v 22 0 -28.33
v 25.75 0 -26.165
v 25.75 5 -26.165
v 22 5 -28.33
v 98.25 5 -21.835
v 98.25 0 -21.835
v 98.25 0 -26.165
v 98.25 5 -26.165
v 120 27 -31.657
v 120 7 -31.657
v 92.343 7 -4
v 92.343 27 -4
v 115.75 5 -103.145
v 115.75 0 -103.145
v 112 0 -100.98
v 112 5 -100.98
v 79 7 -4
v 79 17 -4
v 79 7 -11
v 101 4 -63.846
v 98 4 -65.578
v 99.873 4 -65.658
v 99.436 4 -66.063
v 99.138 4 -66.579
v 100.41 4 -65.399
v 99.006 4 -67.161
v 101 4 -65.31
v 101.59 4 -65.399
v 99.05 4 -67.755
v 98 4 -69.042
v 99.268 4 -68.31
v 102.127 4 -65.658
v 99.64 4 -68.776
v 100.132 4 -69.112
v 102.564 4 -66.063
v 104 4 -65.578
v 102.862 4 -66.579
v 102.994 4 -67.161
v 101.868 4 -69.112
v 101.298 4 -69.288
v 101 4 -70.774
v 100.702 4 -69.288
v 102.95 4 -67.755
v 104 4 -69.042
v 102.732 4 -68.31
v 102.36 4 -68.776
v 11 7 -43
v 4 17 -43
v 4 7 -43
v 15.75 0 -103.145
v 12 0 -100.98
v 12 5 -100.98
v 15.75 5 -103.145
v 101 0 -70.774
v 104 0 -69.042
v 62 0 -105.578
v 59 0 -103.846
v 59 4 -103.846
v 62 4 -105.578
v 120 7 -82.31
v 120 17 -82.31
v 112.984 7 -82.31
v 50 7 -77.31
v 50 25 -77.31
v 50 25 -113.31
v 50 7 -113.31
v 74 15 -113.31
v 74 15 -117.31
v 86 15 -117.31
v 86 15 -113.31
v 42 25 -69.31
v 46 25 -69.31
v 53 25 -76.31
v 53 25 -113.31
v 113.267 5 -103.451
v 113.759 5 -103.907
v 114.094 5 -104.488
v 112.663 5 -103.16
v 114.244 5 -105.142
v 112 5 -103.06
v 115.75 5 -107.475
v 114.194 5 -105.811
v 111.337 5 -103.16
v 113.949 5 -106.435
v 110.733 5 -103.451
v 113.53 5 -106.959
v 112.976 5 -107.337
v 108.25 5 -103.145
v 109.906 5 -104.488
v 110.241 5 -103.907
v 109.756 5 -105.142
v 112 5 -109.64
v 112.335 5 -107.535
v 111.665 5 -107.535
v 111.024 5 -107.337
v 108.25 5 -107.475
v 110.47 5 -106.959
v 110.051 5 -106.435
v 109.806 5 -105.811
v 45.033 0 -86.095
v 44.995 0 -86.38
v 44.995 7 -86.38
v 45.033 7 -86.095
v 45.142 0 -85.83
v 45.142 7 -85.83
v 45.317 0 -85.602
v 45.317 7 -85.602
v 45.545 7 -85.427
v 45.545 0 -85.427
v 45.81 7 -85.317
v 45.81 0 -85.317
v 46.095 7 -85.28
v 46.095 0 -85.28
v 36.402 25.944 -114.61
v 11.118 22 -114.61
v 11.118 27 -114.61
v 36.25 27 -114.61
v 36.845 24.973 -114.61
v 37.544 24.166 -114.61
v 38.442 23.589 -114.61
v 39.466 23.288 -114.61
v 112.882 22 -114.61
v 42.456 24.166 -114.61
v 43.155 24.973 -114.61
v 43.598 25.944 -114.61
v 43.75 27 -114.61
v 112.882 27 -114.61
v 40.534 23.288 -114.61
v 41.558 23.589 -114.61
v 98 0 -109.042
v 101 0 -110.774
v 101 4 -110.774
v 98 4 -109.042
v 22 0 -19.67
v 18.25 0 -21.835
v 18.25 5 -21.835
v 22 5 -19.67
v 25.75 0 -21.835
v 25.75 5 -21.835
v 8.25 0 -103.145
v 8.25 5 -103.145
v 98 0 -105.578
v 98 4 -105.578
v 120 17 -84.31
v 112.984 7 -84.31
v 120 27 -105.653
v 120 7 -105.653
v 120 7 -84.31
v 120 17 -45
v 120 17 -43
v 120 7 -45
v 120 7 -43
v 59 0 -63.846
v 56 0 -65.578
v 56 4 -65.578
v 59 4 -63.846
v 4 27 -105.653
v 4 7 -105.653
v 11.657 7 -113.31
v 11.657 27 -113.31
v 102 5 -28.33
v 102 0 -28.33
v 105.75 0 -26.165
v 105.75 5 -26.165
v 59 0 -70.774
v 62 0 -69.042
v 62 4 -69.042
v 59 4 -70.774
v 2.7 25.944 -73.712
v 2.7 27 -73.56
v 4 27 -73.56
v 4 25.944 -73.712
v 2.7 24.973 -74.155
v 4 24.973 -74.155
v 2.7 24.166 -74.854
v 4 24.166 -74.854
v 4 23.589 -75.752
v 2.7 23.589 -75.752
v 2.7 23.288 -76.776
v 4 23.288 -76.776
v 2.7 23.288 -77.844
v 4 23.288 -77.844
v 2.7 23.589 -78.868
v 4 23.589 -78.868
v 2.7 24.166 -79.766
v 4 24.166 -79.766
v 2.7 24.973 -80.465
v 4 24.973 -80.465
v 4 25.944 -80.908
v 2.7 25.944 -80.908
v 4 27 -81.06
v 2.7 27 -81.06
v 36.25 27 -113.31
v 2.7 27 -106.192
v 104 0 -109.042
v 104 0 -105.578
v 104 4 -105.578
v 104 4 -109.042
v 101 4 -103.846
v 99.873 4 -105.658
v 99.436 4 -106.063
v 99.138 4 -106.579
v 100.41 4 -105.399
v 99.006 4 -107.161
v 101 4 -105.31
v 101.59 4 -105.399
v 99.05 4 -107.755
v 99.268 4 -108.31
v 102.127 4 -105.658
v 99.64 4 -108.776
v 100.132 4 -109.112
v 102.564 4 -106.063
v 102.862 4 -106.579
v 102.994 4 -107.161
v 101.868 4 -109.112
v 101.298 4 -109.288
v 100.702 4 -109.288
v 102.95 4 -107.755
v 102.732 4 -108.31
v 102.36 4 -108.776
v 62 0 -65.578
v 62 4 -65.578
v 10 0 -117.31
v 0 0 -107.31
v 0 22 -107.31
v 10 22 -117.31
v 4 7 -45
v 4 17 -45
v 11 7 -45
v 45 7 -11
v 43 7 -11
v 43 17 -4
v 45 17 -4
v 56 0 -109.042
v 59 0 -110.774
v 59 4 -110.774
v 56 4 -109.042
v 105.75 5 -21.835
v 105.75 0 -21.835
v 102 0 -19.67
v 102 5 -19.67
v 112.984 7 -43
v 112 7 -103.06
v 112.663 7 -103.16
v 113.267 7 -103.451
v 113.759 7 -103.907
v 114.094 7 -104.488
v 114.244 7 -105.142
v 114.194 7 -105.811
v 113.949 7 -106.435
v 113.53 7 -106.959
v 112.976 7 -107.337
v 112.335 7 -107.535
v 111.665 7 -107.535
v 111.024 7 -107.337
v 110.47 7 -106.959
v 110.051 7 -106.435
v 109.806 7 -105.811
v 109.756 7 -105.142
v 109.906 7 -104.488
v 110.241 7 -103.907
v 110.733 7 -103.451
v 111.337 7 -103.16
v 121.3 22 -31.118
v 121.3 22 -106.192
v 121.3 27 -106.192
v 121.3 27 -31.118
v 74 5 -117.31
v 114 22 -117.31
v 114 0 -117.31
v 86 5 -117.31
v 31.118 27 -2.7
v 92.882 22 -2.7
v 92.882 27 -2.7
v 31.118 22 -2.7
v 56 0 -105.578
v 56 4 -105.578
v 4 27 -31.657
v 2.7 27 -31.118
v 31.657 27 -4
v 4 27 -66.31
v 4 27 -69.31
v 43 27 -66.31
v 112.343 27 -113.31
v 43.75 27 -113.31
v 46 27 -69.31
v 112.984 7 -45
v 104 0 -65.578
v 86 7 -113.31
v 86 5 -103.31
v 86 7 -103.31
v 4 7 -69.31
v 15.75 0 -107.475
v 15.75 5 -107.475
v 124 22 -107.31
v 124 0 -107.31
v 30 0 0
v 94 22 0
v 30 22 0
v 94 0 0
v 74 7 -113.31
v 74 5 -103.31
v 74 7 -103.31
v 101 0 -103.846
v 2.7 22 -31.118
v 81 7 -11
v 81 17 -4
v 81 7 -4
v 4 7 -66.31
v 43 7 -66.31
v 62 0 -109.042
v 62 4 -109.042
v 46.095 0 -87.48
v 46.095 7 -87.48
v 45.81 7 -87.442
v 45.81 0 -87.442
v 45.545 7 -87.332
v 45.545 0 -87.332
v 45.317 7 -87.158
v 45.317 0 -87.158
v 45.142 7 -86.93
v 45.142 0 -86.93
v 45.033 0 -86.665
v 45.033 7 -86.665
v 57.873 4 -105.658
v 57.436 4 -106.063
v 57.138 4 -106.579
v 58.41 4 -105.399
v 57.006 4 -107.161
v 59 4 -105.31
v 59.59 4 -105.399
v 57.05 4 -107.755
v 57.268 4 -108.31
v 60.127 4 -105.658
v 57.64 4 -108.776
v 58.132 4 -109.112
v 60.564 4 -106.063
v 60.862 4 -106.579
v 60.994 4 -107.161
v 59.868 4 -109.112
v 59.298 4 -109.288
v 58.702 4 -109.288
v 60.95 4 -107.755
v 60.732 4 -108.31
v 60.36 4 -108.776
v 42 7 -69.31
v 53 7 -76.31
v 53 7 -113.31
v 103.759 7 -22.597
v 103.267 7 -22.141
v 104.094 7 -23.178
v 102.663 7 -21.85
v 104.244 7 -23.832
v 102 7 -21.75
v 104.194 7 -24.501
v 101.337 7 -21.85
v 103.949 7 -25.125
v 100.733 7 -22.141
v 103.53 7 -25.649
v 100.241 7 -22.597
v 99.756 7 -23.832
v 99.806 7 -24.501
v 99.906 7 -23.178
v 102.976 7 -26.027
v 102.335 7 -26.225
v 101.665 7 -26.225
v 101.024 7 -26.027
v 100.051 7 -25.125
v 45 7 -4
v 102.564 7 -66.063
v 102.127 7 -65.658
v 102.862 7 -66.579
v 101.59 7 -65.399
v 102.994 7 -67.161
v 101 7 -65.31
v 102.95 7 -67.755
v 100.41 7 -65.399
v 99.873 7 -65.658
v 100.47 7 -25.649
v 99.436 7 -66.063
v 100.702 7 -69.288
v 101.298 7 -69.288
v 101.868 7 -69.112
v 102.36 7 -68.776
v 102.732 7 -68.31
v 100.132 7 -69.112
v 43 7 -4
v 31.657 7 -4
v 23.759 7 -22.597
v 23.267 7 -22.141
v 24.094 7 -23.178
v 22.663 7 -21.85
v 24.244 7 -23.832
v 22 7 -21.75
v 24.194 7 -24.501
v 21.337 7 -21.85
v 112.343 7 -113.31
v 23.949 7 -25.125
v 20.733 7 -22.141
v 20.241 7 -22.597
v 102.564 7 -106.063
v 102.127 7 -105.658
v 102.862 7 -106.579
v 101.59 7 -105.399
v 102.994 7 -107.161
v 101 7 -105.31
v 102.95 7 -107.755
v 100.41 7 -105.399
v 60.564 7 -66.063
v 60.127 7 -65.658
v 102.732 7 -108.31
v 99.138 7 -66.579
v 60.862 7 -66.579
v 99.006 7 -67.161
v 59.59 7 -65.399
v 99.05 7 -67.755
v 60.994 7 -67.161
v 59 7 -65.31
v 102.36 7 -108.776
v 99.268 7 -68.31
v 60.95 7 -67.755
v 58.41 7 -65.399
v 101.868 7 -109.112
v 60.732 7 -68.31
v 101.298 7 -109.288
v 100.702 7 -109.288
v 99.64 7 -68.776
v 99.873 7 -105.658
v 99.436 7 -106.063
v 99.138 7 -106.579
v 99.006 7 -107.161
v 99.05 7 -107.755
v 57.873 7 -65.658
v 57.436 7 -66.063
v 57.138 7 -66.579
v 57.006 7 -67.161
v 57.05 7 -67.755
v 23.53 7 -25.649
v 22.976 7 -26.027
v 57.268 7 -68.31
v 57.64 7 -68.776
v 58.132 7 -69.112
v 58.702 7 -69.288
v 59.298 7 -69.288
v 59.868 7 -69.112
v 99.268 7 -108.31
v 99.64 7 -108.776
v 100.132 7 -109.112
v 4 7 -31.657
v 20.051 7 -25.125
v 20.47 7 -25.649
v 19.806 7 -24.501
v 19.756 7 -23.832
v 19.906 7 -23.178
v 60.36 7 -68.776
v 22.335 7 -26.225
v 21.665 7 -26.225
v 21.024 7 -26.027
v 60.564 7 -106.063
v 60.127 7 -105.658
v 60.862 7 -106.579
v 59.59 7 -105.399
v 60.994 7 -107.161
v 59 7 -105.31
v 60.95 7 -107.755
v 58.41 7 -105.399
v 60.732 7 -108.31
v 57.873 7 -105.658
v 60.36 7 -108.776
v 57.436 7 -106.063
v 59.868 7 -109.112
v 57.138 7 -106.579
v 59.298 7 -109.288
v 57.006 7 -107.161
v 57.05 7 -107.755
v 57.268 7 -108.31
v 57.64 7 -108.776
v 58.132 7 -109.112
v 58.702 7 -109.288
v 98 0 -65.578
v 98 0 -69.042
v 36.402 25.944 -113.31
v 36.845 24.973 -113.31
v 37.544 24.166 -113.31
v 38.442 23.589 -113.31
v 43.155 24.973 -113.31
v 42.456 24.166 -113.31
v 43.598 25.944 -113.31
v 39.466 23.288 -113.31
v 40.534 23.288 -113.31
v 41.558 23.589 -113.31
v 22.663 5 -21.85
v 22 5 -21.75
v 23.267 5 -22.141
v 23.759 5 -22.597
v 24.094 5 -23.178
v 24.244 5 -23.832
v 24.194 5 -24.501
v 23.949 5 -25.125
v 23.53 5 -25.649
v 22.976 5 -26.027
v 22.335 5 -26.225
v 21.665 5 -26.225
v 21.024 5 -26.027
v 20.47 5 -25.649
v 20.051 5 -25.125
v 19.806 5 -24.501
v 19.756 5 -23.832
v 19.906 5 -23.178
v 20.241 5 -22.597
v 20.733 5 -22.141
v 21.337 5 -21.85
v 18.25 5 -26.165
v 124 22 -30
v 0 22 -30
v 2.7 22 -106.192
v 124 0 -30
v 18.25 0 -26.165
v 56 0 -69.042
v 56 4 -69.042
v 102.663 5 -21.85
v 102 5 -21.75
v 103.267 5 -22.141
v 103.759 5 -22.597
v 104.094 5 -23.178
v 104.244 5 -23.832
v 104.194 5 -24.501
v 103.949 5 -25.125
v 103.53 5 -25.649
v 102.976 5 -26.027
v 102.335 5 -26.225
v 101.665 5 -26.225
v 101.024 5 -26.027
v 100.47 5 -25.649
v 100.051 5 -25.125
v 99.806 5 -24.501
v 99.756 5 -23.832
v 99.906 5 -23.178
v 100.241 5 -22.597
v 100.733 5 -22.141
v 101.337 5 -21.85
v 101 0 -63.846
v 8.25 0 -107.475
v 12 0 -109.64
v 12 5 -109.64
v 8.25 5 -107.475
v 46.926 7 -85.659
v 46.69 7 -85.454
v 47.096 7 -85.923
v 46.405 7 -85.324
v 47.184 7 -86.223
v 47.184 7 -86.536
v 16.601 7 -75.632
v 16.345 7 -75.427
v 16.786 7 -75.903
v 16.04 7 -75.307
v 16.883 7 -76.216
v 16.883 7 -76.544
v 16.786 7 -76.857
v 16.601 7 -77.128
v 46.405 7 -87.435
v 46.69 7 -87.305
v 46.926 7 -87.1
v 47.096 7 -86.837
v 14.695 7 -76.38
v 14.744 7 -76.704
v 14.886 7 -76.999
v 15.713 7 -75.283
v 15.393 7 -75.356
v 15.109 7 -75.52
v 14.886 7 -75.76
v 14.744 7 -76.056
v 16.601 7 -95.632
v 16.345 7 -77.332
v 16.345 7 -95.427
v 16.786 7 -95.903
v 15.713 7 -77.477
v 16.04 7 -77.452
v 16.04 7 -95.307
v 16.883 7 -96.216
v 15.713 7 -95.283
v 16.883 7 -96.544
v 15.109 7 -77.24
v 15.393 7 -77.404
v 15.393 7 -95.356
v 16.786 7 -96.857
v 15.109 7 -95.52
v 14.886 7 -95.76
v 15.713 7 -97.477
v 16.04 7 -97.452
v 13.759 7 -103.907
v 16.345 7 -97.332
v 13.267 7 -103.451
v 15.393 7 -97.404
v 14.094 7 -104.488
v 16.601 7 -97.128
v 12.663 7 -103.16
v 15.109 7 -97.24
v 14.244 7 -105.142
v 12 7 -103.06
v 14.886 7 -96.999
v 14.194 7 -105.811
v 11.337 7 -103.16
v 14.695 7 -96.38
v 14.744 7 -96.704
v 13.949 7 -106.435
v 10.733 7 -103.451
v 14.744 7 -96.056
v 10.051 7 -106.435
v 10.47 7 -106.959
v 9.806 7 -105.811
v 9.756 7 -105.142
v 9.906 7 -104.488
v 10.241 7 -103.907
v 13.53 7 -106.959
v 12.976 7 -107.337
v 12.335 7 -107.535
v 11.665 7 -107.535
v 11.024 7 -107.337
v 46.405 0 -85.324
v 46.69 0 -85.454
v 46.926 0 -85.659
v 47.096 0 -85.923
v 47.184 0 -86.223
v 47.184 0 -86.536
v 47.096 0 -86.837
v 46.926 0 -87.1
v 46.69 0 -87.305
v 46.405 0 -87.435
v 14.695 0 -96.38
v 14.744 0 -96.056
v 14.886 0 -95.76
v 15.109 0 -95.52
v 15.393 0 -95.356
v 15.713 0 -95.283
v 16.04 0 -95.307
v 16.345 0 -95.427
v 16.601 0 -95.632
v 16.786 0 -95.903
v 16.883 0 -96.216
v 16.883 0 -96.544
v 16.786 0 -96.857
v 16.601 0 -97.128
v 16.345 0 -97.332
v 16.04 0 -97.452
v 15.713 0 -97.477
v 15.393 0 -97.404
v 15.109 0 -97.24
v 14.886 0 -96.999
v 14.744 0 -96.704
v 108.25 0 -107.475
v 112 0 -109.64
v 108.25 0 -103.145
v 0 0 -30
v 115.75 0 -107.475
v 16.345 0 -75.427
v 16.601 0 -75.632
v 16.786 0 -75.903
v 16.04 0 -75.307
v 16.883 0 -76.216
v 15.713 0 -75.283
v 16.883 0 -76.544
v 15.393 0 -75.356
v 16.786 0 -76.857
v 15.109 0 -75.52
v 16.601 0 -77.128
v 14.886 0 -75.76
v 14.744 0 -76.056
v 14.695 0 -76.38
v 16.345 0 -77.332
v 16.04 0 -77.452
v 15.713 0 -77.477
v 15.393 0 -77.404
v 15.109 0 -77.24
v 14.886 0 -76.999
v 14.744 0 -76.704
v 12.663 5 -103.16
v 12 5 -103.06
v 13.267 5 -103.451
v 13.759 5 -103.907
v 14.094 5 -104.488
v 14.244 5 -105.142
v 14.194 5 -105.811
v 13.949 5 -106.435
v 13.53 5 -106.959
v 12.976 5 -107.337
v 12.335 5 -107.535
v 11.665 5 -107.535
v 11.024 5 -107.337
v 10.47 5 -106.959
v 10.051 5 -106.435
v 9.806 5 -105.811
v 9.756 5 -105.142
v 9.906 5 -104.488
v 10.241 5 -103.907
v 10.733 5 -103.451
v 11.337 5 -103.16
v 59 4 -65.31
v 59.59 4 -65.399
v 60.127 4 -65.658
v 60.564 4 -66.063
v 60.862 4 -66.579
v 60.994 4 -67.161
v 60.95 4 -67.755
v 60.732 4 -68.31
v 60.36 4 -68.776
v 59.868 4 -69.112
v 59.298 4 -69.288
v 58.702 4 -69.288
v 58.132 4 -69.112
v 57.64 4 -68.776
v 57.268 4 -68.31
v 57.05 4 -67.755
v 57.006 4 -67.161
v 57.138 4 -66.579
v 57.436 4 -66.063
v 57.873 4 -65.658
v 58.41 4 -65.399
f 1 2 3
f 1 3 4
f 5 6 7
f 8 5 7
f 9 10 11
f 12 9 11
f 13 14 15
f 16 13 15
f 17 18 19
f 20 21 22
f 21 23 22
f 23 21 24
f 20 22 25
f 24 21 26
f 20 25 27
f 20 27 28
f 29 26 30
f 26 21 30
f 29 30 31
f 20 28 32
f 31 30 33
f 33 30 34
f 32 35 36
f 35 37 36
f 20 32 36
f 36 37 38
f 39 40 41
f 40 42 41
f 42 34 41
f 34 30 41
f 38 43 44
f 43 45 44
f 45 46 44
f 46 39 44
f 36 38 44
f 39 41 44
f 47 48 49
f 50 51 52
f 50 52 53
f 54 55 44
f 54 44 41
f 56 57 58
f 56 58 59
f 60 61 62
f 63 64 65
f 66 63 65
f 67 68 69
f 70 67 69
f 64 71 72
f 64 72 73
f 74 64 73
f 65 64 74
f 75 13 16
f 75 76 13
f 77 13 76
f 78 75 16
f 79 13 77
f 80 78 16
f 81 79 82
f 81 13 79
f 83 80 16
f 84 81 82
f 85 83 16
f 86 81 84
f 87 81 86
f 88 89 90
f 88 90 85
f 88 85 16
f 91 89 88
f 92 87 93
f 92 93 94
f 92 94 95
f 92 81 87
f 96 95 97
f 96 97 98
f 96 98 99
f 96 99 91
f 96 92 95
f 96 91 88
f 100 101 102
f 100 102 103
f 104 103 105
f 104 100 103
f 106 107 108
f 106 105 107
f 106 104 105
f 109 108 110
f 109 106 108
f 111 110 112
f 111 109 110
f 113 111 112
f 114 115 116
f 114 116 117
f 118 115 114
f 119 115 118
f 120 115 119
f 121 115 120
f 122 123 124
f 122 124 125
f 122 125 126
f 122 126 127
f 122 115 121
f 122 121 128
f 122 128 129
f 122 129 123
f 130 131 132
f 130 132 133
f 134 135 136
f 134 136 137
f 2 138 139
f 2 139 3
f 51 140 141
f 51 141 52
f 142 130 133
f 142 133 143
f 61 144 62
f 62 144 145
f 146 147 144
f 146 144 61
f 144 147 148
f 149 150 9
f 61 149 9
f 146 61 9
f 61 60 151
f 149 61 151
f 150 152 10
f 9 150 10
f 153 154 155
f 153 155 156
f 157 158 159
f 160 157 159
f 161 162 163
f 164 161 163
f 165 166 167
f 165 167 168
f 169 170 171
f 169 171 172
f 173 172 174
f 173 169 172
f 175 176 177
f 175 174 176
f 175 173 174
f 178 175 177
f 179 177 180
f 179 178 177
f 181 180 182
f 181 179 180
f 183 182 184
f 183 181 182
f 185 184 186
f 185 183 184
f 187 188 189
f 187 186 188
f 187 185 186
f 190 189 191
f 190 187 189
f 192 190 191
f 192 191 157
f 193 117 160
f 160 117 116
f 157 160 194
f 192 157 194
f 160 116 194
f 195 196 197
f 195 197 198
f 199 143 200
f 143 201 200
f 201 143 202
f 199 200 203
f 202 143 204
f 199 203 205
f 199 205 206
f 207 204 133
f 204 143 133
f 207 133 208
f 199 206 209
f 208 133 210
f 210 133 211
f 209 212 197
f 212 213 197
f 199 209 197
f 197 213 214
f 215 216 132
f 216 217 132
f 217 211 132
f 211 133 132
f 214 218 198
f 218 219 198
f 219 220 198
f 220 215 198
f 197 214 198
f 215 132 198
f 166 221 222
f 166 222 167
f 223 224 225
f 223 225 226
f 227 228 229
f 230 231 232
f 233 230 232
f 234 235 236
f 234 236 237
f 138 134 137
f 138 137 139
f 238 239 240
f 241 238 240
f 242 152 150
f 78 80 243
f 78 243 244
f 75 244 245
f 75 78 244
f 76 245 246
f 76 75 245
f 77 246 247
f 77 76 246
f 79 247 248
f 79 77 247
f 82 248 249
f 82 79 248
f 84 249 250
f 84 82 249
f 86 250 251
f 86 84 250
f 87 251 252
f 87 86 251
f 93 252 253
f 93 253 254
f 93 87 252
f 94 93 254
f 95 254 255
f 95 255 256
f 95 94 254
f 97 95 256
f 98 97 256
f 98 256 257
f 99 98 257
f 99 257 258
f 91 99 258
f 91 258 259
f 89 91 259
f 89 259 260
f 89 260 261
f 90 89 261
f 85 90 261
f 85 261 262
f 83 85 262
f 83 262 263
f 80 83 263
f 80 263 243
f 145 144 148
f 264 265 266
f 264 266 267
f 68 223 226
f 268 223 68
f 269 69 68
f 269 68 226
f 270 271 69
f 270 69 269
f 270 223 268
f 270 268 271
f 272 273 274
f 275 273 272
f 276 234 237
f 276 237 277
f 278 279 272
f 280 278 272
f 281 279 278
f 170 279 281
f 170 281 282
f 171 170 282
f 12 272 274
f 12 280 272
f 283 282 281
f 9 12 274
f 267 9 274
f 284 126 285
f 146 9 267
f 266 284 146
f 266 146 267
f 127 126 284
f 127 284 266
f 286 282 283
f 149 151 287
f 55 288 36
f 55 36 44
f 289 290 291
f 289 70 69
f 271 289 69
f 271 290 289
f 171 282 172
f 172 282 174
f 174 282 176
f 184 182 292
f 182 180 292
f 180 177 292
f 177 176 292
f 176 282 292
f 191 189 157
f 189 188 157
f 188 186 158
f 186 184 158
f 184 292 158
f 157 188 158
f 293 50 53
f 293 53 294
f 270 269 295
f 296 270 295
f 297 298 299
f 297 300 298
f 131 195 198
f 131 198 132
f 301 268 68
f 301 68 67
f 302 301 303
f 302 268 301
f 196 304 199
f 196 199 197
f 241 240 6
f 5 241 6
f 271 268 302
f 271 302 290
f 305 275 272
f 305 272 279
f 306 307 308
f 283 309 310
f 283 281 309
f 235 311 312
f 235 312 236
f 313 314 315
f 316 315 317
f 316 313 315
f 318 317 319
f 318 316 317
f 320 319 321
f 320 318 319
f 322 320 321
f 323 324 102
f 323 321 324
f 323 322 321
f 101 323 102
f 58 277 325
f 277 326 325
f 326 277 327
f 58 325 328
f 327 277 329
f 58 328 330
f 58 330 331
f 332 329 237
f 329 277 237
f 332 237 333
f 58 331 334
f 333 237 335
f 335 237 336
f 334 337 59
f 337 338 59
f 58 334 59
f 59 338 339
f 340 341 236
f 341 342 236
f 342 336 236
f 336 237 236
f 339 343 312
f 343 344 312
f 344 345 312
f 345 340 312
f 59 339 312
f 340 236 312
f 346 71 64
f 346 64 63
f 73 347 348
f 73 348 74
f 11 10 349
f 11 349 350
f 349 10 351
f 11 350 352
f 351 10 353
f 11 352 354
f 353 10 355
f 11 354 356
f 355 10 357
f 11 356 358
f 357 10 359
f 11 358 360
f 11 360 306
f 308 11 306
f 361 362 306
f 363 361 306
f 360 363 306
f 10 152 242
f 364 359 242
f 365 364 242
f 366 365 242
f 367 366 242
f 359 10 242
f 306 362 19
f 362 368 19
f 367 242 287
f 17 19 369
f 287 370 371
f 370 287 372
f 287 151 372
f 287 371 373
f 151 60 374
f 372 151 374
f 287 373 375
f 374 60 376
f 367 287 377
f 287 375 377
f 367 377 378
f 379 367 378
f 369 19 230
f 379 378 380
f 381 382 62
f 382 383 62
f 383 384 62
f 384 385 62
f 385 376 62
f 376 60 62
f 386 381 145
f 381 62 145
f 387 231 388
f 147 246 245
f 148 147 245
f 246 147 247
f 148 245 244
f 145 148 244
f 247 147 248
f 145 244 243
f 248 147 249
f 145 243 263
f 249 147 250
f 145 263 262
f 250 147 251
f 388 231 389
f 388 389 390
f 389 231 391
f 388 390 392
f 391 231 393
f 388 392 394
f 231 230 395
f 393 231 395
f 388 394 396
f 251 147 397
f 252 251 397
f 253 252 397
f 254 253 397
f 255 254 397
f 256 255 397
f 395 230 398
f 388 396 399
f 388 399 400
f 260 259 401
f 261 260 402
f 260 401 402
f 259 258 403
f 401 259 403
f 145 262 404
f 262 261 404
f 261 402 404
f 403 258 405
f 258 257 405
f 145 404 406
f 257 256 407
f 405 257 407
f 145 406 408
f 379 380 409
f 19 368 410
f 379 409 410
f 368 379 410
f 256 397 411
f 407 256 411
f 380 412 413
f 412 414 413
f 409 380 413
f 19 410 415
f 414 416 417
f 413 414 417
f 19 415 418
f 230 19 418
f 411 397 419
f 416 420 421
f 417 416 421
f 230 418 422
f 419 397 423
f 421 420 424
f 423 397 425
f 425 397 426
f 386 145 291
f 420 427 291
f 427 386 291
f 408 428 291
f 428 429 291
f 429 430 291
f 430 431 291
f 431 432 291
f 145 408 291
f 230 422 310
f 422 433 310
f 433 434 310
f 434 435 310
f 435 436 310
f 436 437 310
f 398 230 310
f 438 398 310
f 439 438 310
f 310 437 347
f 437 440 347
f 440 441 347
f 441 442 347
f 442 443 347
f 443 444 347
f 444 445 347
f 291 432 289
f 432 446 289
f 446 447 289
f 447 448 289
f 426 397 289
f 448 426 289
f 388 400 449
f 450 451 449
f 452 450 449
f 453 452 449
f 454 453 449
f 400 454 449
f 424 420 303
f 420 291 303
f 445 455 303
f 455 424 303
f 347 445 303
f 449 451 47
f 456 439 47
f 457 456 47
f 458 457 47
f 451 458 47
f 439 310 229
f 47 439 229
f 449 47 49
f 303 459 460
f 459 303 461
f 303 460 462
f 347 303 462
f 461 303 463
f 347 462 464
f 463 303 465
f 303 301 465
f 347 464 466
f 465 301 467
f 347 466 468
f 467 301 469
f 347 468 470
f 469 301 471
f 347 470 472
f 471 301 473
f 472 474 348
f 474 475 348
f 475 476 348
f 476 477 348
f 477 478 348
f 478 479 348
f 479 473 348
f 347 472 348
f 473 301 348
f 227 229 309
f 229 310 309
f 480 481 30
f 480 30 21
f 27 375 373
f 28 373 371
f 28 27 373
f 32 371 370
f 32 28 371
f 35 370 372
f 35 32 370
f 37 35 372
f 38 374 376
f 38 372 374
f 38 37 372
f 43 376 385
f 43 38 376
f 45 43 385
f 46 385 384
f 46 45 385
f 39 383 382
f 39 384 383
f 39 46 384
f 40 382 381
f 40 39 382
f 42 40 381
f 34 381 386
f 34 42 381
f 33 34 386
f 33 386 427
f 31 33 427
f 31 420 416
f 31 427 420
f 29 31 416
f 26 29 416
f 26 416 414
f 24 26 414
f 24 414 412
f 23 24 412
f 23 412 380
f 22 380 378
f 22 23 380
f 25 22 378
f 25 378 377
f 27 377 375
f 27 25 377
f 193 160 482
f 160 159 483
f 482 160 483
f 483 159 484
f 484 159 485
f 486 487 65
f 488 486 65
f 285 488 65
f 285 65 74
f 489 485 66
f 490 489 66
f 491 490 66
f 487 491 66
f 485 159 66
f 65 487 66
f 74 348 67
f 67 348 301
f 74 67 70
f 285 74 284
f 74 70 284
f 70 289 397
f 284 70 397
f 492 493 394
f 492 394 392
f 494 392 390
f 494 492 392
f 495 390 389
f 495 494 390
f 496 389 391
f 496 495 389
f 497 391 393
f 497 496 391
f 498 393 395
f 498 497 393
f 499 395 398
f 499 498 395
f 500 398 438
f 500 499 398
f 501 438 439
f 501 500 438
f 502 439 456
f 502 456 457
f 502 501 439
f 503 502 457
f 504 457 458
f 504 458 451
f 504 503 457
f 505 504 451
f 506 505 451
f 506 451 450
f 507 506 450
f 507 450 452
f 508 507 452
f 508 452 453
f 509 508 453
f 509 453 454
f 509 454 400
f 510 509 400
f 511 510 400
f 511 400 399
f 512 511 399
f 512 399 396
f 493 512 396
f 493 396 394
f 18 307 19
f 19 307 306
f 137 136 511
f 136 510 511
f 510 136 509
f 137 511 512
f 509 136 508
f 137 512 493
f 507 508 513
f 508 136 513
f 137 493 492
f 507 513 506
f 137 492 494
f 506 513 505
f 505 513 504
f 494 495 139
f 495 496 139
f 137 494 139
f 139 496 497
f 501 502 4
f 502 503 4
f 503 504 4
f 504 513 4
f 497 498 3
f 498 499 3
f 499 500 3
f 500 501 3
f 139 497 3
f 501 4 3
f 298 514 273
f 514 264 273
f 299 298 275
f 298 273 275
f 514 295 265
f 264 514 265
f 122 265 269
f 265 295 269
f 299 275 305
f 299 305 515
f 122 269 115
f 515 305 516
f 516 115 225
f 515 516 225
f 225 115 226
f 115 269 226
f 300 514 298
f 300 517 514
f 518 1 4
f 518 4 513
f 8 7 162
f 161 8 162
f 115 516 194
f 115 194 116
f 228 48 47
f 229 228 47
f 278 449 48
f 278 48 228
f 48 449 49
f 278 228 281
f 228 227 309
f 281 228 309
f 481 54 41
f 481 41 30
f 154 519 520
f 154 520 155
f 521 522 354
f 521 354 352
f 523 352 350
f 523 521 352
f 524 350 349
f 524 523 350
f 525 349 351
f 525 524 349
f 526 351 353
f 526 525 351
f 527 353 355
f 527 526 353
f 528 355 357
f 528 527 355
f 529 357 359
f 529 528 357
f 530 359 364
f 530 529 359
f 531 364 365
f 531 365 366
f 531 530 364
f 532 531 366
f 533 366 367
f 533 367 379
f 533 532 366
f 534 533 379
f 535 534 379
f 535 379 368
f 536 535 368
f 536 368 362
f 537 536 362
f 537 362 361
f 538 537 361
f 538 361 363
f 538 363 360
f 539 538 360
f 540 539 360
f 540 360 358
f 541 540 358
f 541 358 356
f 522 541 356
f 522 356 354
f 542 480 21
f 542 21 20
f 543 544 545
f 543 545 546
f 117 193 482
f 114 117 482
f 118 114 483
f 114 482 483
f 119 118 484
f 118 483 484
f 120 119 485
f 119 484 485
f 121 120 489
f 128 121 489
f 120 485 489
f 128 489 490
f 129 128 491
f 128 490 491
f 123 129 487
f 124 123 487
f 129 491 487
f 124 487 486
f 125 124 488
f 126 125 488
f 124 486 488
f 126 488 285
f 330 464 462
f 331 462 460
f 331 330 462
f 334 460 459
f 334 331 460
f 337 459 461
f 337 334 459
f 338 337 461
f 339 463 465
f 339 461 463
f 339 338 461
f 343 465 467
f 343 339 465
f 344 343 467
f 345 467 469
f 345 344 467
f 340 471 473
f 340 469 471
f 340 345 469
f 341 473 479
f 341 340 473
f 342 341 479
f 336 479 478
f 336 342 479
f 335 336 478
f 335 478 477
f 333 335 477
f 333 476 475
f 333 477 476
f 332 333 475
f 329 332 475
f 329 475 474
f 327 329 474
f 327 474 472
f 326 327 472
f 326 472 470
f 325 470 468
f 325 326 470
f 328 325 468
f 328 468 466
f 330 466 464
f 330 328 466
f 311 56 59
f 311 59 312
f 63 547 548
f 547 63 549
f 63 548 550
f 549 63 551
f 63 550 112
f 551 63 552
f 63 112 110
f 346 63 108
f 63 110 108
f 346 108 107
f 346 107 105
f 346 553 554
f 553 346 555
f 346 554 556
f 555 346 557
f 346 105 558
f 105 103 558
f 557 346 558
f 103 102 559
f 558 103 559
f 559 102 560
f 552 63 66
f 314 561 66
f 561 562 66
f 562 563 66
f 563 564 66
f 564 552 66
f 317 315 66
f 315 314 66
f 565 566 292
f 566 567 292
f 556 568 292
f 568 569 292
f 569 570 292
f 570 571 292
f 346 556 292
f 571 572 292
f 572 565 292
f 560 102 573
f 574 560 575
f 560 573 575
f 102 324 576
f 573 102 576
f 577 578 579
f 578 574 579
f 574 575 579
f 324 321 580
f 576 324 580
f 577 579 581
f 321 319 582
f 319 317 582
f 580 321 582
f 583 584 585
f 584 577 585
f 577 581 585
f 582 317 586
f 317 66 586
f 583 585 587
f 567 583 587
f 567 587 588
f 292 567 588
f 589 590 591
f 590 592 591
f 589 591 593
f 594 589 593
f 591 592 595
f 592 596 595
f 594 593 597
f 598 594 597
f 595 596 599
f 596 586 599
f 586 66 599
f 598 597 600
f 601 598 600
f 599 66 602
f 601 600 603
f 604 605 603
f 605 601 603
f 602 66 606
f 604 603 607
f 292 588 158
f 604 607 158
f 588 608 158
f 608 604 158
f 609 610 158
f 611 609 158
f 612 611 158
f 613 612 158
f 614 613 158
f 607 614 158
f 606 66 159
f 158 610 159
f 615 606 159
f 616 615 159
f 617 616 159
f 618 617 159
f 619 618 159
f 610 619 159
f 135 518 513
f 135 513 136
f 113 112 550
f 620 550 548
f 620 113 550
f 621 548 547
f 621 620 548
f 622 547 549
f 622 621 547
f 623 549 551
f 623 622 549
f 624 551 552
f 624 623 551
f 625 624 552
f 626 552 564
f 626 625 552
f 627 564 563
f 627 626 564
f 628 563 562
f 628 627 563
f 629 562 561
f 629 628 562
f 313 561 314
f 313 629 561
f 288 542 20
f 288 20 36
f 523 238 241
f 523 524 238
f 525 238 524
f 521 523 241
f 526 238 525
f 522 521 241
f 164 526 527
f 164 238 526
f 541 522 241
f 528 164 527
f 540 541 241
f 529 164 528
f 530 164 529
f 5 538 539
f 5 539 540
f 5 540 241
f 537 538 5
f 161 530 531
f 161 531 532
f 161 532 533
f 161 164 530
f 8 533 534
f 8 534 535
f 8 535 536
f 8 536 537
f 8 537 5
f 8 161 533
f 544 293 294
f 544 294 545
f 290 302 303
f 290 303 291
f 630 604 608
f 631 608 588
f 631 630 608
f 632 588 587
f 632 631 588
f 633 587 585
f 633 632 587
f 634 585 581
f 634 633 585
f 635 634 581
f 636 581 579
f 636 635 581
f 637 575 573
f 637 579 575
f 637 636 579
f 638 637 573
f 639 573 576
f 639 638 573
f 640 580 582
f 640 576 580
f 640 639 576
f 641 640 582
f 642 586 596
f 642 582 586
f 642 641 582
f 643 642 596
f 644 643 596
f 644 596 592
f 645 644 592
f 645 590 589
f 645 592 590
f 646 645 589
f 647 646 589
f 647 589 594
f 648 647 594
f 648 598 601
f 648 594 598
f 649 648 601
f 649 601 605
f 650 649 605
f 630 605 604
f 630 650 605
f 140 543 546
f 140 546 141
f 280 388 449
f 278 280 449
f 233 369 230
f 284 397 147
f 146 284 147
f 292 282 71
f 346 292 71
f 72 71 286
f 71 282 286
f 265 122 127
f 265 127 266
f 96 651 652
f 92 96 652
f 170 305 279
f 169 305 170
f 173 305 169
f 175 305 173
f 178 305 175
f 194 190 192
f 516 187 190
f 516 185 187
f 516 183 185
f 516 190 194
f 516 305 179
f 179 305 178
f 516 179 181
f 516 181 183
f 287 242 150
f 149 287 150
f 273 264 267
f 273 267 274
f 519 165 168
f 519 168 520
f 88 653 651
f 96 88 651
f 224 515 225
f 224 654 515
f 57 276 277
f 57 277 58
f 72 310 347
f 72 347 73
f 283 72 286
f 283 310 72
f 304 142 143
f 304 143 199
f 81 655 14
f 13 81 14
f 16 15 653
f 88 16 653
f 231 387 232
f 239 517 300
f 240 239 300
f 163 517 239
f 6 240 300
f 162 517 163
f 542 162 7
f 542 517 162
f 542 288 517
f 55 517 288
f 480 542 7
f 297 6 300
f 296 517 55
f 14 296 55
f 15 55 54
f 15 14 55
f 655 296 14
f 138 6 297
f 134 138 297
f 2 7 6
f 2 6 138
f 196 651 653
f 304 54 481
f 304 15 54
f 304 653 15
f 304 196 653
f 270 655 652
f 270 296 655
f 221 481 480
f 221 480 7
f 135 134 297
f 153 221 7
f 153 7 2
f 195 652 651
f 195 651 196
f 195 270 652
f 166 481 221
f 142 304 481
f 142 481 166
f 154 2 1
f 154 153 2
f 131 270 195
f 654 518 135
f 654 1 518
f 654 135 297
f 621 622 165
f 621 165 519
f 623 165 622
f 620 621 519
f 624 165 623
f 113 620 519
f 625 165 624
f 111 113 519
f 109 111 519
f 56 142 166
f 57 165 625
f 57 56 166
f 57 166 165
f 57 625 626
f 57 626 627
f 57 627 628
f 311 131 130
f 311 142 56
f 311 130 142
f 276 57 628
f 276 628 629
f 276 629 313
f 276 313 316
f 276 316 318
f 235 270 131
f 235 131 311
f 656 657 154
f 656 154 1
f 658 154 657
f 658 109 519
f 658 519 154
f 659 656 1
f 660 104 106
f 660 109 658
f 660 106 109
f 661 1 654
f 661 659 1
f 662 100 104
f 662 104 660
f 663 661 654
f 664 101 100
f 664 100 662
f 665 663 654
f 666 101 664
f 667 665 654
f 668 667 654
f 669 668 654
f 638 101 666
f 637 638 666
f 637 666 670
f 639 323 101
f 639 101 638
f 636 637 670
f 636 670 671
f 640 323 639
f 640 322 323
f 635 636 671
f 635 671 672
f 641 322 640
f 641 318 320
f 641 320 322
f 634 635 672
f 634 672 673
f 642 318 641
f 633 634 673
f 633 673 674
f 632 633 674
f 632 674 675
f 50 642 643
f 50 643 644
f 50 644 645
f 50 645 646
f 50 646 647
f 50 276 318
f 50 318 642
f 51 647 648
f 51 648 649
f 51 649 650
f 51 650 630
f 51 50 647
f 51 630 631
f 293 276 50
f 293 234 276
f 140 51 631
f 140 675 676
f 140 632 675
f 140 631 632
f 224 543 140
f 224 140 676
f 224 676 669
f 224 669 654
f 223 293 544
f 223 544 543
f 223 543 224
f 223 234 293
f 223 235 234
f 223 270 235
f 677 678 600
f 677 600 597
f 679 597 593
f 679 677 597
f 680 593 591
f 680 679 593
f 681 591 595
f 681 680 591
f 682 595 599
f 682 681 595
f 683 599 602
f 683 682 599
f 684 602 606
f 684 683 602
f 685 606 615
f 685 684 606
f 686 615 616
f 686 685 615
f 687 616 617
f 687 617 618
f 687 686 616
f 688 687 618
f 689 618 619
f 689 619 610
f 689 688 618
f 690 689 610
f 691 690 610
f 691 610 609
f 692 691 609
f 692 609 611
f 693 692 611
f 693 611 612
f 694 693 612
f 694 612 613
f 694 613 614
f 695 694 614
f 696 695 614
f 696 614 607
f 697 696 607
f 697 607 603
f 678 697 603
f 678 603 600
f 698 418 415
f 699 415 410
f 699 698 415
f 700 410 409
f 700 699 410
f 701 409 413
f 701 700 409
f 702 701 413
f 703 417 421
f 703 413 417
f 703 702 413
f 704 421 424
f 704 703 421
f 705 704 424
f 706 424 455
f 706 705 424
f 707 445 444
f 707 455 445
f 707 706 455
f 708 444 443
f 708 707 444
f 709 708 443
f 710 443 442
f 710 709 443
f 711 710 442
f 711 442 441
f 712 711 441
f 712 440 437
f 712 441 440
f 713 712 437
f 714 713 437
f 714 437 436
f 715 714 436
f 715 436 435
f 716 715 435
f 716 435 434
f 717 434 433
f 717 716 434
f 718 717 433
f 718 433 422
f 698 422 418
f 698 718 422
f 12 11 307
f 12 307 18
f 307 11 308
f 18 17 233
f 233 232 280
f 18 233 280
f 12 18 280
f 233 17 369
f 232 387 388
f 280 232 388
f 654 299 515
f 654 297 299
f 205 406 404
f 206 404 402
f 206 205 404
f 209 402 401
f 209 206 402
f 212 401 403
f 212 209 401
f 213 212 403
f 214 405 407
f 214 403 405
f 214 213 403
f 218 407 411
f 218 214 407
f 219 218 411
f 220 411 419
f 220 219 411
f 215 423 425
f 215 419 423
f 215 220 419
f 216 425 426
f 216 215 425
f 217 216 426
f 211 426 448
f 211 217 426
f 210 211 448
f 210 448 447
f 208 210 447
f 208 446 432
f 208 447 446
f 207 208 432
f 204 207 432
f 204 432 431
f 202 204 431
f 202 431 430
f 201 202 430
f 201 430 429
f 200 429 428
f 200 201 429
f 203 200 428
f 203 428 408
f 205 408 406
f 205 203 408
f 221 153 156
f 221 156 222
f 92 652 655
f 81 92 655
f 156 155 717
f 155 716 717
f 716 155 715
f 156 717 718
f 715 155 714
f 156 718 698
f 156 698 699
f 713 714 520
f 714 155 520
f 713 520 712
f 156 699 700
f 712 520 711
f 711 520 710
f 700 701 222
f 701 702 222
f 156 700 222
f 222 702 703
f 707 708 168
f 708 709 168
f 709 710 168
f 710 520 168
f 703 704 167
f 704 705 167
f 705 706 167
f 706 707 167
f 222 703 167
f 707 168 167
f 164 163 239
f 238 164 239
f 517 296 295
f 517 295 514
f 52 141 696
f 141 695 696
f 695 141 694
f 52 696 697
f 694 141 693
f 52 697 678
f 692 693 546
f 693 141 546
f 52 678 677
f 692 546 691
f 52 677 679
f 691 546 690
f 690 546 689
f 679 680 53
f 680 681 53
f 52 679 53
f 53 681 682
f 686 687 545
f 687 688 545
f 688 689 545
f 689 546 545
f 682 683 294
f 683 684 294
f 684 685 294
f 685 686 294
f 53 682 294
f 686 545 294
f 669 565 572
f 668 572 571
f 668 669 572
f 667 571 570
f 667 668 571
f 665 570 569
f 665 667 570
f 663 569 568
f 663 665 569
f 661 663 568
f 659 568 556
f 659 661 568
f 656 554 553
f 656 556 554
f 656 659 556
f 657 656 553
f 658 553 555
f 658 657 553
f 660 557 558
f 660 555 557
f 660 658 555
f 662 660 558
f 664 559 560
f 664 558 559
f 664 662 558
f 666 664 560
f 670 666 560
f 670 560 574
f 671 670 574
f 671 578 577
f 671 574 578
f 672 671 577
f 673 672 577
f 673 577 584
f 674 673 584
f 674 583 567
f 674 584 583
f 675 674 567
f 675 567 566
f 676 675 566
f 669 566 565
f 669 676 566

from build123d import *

# Parameters (mm, degrees)
ESQUISSE1_W              = 124
ESQUISSE1_H              = 117.31
ESQUISSE1_R              = 2.25
BOSS_EXTRU_1_DEPTH       = 7
CHANFREIN1_SIZE          = 30
CHANFREIN2_SIZE          = 10
ESQUISSE1_4_R            = 2.25
ENL_V_MAT_EXTRU_1_DEPTH  = 5
BOSS_EXTRU_2_START       = 7
BOSS_EXTRU_2_DEPTH       = 15
BOSS_EXTRU_3_START       = 7
BOSS_EXTRU_3_DEPTH       = 20
ENL_V_START              = -113.31
ESQUISSE4_R              = 3.75
ENL_V_MAT_EXTRU_5_DEPTH  = 10
ESQUISSE3_R              = 3.75
ENL_V_MAT_EXTRU_6_DEPTH  = 10
ESQUISSE6_R              = 2
ENL_V_MAT_EXTRU_7_DEPTH  = 10
ESQUISSE6_8_R            = 2
ENL_V_MAT_EXTRU_8_DEPTH  = 4
ENL_V_START_2            = 5
ESQUISSE6_9_W            = 8.5
ESQUISSE6_9_H            = 7.5
ESQUISSE6_9_H_2          = 1.6
ENL_V_MAT_EXTRU_9_DEPTH  = 10
NERVURE1_START           = -1
NERVURE1_DEPTH           = 2
NERVURE3_REACH           = 146.536
ESQUISSE9_WALL_W         = 303.278422804
ESQUISSE9_WALL_H         = 2
NERVURE6_START           = -1
NERVURE6_DEPTH           = 2
NERVURE7_REACH           = 148.558
ESQUISSE11_WALL_W        = 307.323297546
ESQUISSE11_WALL_H        = 2
ENL_V_MAT_EXTRU_11_DEPTH = 10
BOSS_EXTRU_4_DEPTH       = 2
BOSS_EXTRU_4_DEPTH_BACK  = 1
ESQUISSE14_W             = 45
ESQUISSE14_H             = 18
BOSS_EXTRU_5_DEPTH       = 2
BOSS_EXTRU_5_DEPTH_BACK  = 1
ESQUISSE15_W             = 49
ESQUISSE15_H             = 20
CHANFREIN3_SIZE          = 8
CHANFREIN4_SIZE          = 10
NERVURE8_REACH           = 153.808
ESQUISSE16_WALL_W        = 317.831069122
ESQUISSE16_WALL_H        = 2


# Read off the part's stored shape, not the designer's step: Nervure1, Nervure6
with BuildPart() as part:
    # Esquisse1 → Boss.-Extru.1 (new body)
    # profile 1 of 5: a face of its own
    with BuildSketch(Plane(origin=(0, 0, 0), x_dir=(1, 0, 0), z_dir=(0, 1, 0))):
        with Locations((62, 58.655)):
            Rectangle(ESQUISSE1_W, ESQUISSE1_H)
        Polygon((22, 19.669872981), (25.75, 21.834936491), (25.75, 26.165063509), (22, 28.330127019), (18.25, 26.165063509), (18.25, 21.834936491), align=None, mode=Mode.SUBTRACT)
        Polygon((12, 100.979872981), (15.75, 103.144936491), (15.75, 107.475063509), (12, 109.640127019), (8.25, 107.475063509), (8.25, 103.144936491), align=None, mode=Mode.SUBTRACT)
        Polygon((102, 19.669872981), (98.25, 21.834936491), (98.25, 26.165063509), (102, 28.330127019), (105.75, 26.165063509), (105.75, 21.834936491), align=None, mode=Mode.SUBTRACT)
        Polygon((112, 100.979872981), (108.25, 103.144936491), (108.25, 107.475063509), (112, 109.640127019), (115.75, 107.475063509), (115.75, 103.144936491), align=None, mode=Mode.SUBTRACT)
    # profile 2 of 5: a face of its own
    with BuildSketch(Plane(origin=(0, 0, 0), x_dir=(1, 0, 0), z_dir=(0, 1, 0))):
        Polygon((18.25, 21.834936491), (22, 19.669872981), (25.75, 21.834936491), (25.75, 26.165063509), (22, 28.330127019), (18.25, 26.165063509), align=None)
        with Locations(Location((22, 24, 0), (0, 0, 270))):
            Circle(ESQUISSE1_R, mode=Mode.SUBTRACT)
    # profile 3 of 5: a face of its own
    with BuildSketch(Plane(origin=(0, 0, 0), x_dir=(1, 0, 0), z_dir=(0, 1, 0))):
        Polygon((8.25, 103.144936491), (12, 100.979872981), (15.75, 103.144936491), (15.75, 107.475063509), (12, 109.640127019), (8.25, 107.475063509), align=None)
        with Locations(Location((12, 105.31, 0), (0, 0, 270))):
            Circle(ESQUISSE1_R, mode=Mode.SUBTRACT)
    # profile 4 of 5: a face of its own
    with BuildSketch(Plane(origin=(0, 0, 0), x_dir=(1, 0, 0), z_dir=(0, 1, 0))):
        Polygon((108.25, 103.144936491), (108.25, 107.475063509), (112, 109.640127019), (115.75, 107.475063509), (115.75, 103.144936491), (112, 100.979872981), align=None)
        with Locations(Location((112, 105.31, 0), (0, 0, 270))):
            Circle(ESQUISSE1_R, mode=Mode.SUBTRACT)
    # profile 5 of 5: a face of its own
    with BuildSketch(Plane(origin=(0, 0, 0), x_dir=(1, 0, 0), z_dir=(0, 1, 0))):
        Polygon((98.25, 21.834936491), (98.25, 26.165063509), (102, 28.330127019), (105.75, 26.165063509), (105.75, 21.834936491), (102, 19.669872981), align=None)
        with Locations(Location((102, 24, 0), (0, 0, 270))):
            Circle(ESQUISSE1_R, mode=Mode.SUBTRACT)
    extrude(amount=BOSS_EXTRU_1_DEPTH)

    # Chanfrein1
    chanfrein1_edges = [part.edges().sort_by_distance(p)[0] for p in [
        (0, 3.5, 0),
        (124, 3.5, 0),
    ]]
    chamfer(chanfrein1_edges, length=CHANFREIN1_SIZE)

    # Chanfrein2
    chanfrein2_edges = [part.edges().sort_by_distance(p)[0] for p in [
        (0, 3.5, -117.31),
        (124, 3.5, -117.31),
    ]]
    chamfer(chanfrein2_edges, length=CHANFREIN2_SIZE)

    # Esquisse1<4> → Enlèv. mat.-Extru.1 (cut)
    # profile 1 of 4: a face of its own
    with BuildSketch(Plane(origin=(0, 0, 0), x_dir=(1, 0, 0), z_dir=(0, 1, 0))):
        Polygon((8.25, 103.144936491), (12, 100.979872981), (15.75, 103.144936491), (15.75, 107.475063509), (12, 109.640127019), (8.25, 107.475063509), align=None)
        with Locations(Location((12, 105.31, 0), (0, 0, 270))):
            Circle(ESQUISSE1_4_R, mode=Mode.SUBTRACT)
    # profile 2 of 4: a face of its own
    with BuildSketch(Plane(origin=(0, 0, 0), x_dir=(1, 0, 0), z_dir=(0, 1, 0))):
        Polygon((18.25, 21.834936491), (22, 19.669872981), (25.75, 21.834936491), (25.75, 26.165063509), (22, 28.330127019), (18.25, 26.165063509), align=None)
        with Locations(Location((22, 24, 0), (0, 0, 270))):
            Circle(ESQUISSE1_4_R, mode=Mode.SUBTRACT)
    # profile 3 of 4: a face of its own
    with BuildSketch(Plane(origin=(0, 0, 0), x_dir=(1, 0, 0), z_dir=(0, 1, 0))):
        Polygon((98.25, 21.834936491), (98.25, 26.165063509), (102, 28.330127019), (105.75, 26.165063509), (105.75, 21.834936491), (102, 19.669872981), align=None)
        with Locations(Location((102, 24, 0), (0, 0, 270))):
            Circle(ESQUISSE1_4_R, mode=Mode.SUBTRACT)
    # profile 4 of 4: a face of its own
    with BuildSketch(Plane(origin=(0, 0, 0), x_dir=(1, 0, 0), z_dir=(0, 1, 0))):
        Polygon((108.25, 103.144936491), (108.25, 107.475063509), (112, 109.640127019), (115.75, 107.475063509), (115.75, 103.144936491), (112, 100.979872981), align=None)
        with Locations(Location((112, 105.31, 0), (0, 0, 270))):
            Circle(ESQUISSE1_4_R, mode=Mode.SUBTRACT)
    extrude(amount=ENL_V_MAT_EXTRU_1_DEPTH, mode=Mode.SUBTRACT)

    # Esquisse2 → Boss.-Extru.2 (add)
    with BuildSketch(Plane(origin=(0, 0, 0), x_dir=(1, 0, 0), z_dir=(0, 1, 0)).offset(BOSS_EXTRU_2_START)):
        Polygon((0, 30), (0, 107.31), (10, 117.31), (114, 117.31), (124, 107.31), (124, 30), (94, 0), (30, 0), align=None)
        Polygon((92.881623382, 2.7), (31.118376618, 2.7), (2.7, 31.118376618), (2.7, 106.191623382), (11.118376618, 114.61), (112.881623382, 114.61), (121.3, 106.191623382), (121.3, 31.118376618), align=None, mode=Mode.SUBTRACT)
    extrude(amount=BOSS_EXTRU_2_DEPTH)

    # Esquisse2<3> → Boss.-Extru.3 (add)
    with BuildSketch(Plane(origin=(0, 0, 0), x_dir=(1, 0, 0), z_dir=(0, 1, 0)).offset(BOSS_EXTRU_3_START)):
        Polygon((31.118376618, 2.7), (2.7, 31.118376618), (2.7, 106.191623382), (11.118376618, 114.61), (112.881623382, 114.61), (121.3, 106.191623382), (121.3, 31.118376618), (92.881623382, 2.7), align=None)
        Polygon((31.656854249, 4), (4, 31.656854249), (4, 105.653145751), (11.656854249, 113.31), (112.343145751, 113.31), (120, 105.653145751), (120, 31.656854249), (92.343145751, 4), align=None, mode=Mode.SUBTRACT)
    extrude(amount=BOSS_EXTRU_3_DEPTH)

    # Esquisse4 → Enlèv. mat.-Extru.5 (cut)
    with BuildSketch(Plane.XY.offset(ENL_V_START)):
        with Locations((40, 27)):
            Circle(ESQUISSE4_R)
    extrude(amount=-ENL_V_MAT_EXTRU_5_DEPTH, mode=Mode.SUBTRACT)

    # Esquisse3 → Enlèv. mat.-Extru.6 (cut)
    with BuildSketch(Plane(origin=(0, 0, 0), x_dir=(0, 0, -1), z_dir=(1, 0, 0))):
        with Locations((77.31, 27)):
            Circle(ESQUISSE3_R)
    extrude(amount=ENL_V_MAT_EXTRU_6_DEPTH, mode=Mode.SUBTRACT)

    # Esquisse6 → Enlèv. mat.-Extru.7 (cut)
    with BuildSketch(Plane(origin=(0, 0, 0), x_dir=(1, 0, 0), z_dir=(0, 1, 0))):
        with Locations(Location((101, 107.31, 0), (0, 0, 270))):
            Circle(ESQUISSE6_R)
        with Locations(Location((59, 107.31, 0), (0, 0, 270))):
            Circle(ESQUISSE6_R)
        with Locations(Location((59, 67.31, 0), (0, 0, 270))):
            Circle(ESQUISSE6_R)
        with Locations(Location((101, 67.31, 0), (0, 0, 270))):
            Circle(ESQUISSE6_R)
    extrude(amount=ENL_V_MAT_EXTRU_7_DEPTH, mode=Mode.SUBTRACT)

    # Esquisse6<8> → Enlèv. mat.-Extru.8 (cut)
    # profile 1 of 4: a face of its own
    with BuildSketch(Plane(origin=(0, 0, 0), x_dir=(1, 0, 0), z_dir=(0, 1, 0))):
        Polygon((98, 109.042050808), (98, 105.577949192), (101, 103.845898385), (104, 105.577949192), (104, 109.042050808), (101, 110.774101615), align=None)
        with Locations(Location((101, 107.31, 0), (0, 0, 270))):
            Circle(ESQUISSE6_8_R, mode=Mode.SUBTRACT)
    # profile 2 of 4: a face of its own
    with BuildSketch(Plane(origin=(0, 0, 0), x_dir=(1, 0, 0), z_dir=(0, 1, 0))):
        Polygon((56, 109.042050808), (56, 105.577949192), (59, 103.845898385), (62, 105.577949192), (62, 109.042050808), (59, 110.774101615), align=None)
        with Locations(Location((59, 107.31, 0), (0, 0, 270))):
            Circle(ESQUISSE6_8_R, mode=Mode.SUBTRACT)
    # profile 3 of 4: a face of its own
    with BuildSketch(Plane(origin=(0, 0, 0), x_dir=(1, 0, 0), z_dir=(0, 1, 0))):
        Polygon((56, 69.042050808), (56, 65.577949192), (59, 63.845898385), (62, 65.577949192), (62, 69.042050808), (59, 70.774101615), align=None)
        with Locations(Location((59, 67.31, 0), (0, 0, 270))):
            Circle(ESQUISSE6_8_R, mode=Mode.SUBTRACT)
    # profile 4 of 4: a face of its own
    with BuildSketch(Plane(origin=(0, 0, 0), x_dir=(1, 0, 0), z_dir=(0, 1, 0))):
        Polygon((98, 69.042050808), (98, 65.577949192), (101, 63.845898385), (104, 65.577949192), (104, 69.042050808), (101, 70.774101615), align=None)
        with Locations(Location((101, 67.31, 0), (0, 0, 270))):
            Circle(ESQUISSE6_8_R, mode=Mode.SUBTRACT)
    extrude(amount=ENL_V_MAT_EXTRU_8_DEPTH, mode=Mode.SUBTRACT)

    # Esquisse6<9> → Enlèv. mat.-Extru.9 (cut)
    with BuildSketch(Plane(origin=(0, 0, 0), x_dir=(1, 0, 0), z_dir=(0, 1, 0)).offset(ENL_V_START_2)):
        Polygon((74, 117.31), (74, 112.31), (75.75, 112.31), (75.75, 113.91), (84.25, 113.91), (84.25, 112.31), (86, 112.31), (86, 117.31), align=None)
        Polygon((75.75, 112.31), (74, 112.31), (74, 103.31), (86, 103.31), (86, 112.31), (84.25, 112.31), (84.25, 104.81), (75.75, 104.81), align=None)
        with Locations((80, 108.56)):
            Rectangle(ESQUISSE6_9_W, ESQUISSE6_9_H)
        with Locations((80, 113.11)):
            Rectangle(ESQUISSE6_9_W, ESQUISSE6_9_H_2)
    extrude(amount=ENL_V_MAT_EXTRU_9_DEPTH, mode=Mode.SUBTRACT)

    # Nervure1 outline → Nervure1 (add)
    with BuildSketch(Plane(origin=(44, 0, 0), x_dir=(0, 0, -1), z_dir=(1, 0, 0)).offset(NERVURE1_START)):
        Polygon((11, 7), (4, 17), (4, 7), align=None)
    extrude(amount=NERVURE1_DEPTH)

    # Esquisse9 wall → Nervure3 (add, up to next)
    with BuildSketch(Plane(origin=(80, 12, -7.5), x_dir=(0, -0.819231920519, -0.573462344363), z_dir=(0, -0.573462344363, 0.819231920519)), mode=Mode.PRIVATE) as nervure3_sk1:
        Rectangle(ESQUISSE9_WALL_W, ESQUISSE9_WALL_H)
    nervure3_tool1 = extrude(nervure3_sk1.sketch, amount=NERVURE3_REACH, mode=Mode.PRIVATE) - part.part
    add(nervure3_tool1.solids().sort_by_distance((80, 12, -7.5))[0])

    # Nervure6 outline → Nervure6 (add)
    with BuildSketch(Plane(origin=(0, 0, -44), x_dir=(-1, 0, 0), z_dir=(0, 0, -1)).offset(NERVURE6_START)):
        Polygon((-112.98387136, 7), (-120, 17), (-120, 7), align=None)
    extrude(amount=NERVURE6_DEPTH)

    # Esquisse11 wall → Nervure7 (add, up to next)
    with BuildSketch(Plane(origin=(7.5, 12, -44), x_dir=(0.573462344363, -0.819231920519, 0), z_dir=(-0.819231920519, -0.573462344363, 0)), mode=Mode.PRIVATE) as nervure7_sk1:
        Rectangle(ESQUISSE11_WALL_W, ESQUISSE11_WALL_H)
    nervure7_tool1 = extrude(nervure7_sk1.sketch, amount=NERVURE7_REACH, mode=Mode.PRIVATE) - part.part
    add(nervure7_tool1.solids().sort_by_distance((7.5, 12, -44))[0])

    # Esquisse13 → Enlèv. mat.-Extru.11 (cut)
    with BuildSketch(Plane(origin=(57.878823339, 0, -164.935388349), x_dir=(-1, 0, 0), z_dir=(0, 1, 0))):
        with BuildLine():
            ThreePointArc((40.983764069, 68.555579041), (42.083764069, 67.455579041), (43.183764069, 68.555579041))
            Line((43.183764069, 68.555579041), (40.983764069, 68.555579041))
        make_face()
        with BuildLine():
            Line((40.983764069, 68.555579041), (43.183764069, 68.555579041))
            ThreePointArc((43.183764069, 68.555579041), (42.083764069, 69.655579041), (40.983764069, 68.555579041))
        make_face()
        with BuildLine():
            ThreePointArc((40.983764069, 88.555579041), (42.083764069, 87.455579041), (43.183764069, 88.555579041))
            Line((43.183764069, 88.555579041), (40.983764069, 88.555579041))
        make_face()
        with BuildLine():
            Line((40.983764069, 88.555579041), (43.183764069, 88.555579041))
            ThreePointArc((43.183764069, 88.555579041), (42.083764069, 89.655579041), (40.983764069, 88.555579041))
        make_face()
        with BuildLine():
            ThreePointArc((11.783764069, 79.655579041), (10.683764069, 78.555579041), (11.783764069, 77.455579041))
            Line((11.783764069, 77.455579041), (11.783764069, 79.655579041))
        make_face()
        with BuildLine():
            Line((11.783764069, 79.655579041), (11.783764069, 77.455579041))
            ThreePointArc((11.783764069, 77.455579041), (12.561581528, 77.777761581), (12.883764069, 78.555579041))
            ThreePointArc((12.883764069, 78.555579041), (12.561581528, 79.3333965), (11.783764069, 79.655579041))
        make_face()
    extrude(amount=ENL_V_MAT_EXTRU_11_DEPTH, mode=Mode.SUBTRACT)

    # Esquisse14 → Boss.-Extru.4 (add, two sides: drawn at the far end of the back side and taken through both)
    with BuildSketch(Plane(origin=(51, 0, 0), x_dir=(0, 0, -1), z_dir=(1, 0, 0)).offset(-BOSS_EXTRU_4_DEPTH_BACK)):
        with Locations((90.81, 16)):
            Rectangle(ESQUISSE14_W, ESQUISSE14_H)
    extrude(amount=BOSS_EXTRU_4_DEPTH + BOSS_EXTRU_4_DEPTH_BACK)

    # Esquisse15 → Boss.-Extru.5 (add, two sides: drawn at the far end of the back side and taken through both)
    with BuildSketch(Plane.XY.offset(-68.31).offset(-BOSS_EXTRU_5_DEPTH_BACK)):
        with Locations((28.5, 17)):
            Rectangle(ESQUISSE15_W, ESQUISSE15_H)
    extrude(amount=BOSS_EXTRU_5_DEPTH + BOSS_EXTRU_5_DEPTH_BACK)

    # Chanfrein3
    chanfrein3_edges = [part.edges().sort_by_distance(p)[0] for p in [
        (50, 16, -69.31),
    ]]
    chamfer(chanfrein3_edges, length=CHANFREIN3_SIZE)

    # Chanfrein4
    chanfrein4_edges = [part.edges().sort_by_distance(p)[0] for p in [
        (53, 17, -66.31),
    ]]
    chamfer(chanfrein4_edges, length=CHANFREIN4_SIZE)

    # Esquisse16 wall → Nervure8 (add, up to next)
    with BuildSketch(Plane(origin=(116.49193568, 12, -83.31), x_dir=(-0.574348121974, -0.818611162143, 0), z_dir=(0.818611162143, -0.574348121974, 0)), mode=Mode.PRIVATE) as nervure8_sk1:
        Rectangle(ESQUISSE16_WALL_W, ESQUISSE16_WALL_H)
    nervure8_tool1 = extrude(nervure8_sk1.sketch, amount=NERVURE8_REACH, mode=Mode.PRIVATE) - part.part
    add(nervure8_tool1.solids().sort_by_distance((116.49193568, 12, -83.31))[0])


solid = part.part
